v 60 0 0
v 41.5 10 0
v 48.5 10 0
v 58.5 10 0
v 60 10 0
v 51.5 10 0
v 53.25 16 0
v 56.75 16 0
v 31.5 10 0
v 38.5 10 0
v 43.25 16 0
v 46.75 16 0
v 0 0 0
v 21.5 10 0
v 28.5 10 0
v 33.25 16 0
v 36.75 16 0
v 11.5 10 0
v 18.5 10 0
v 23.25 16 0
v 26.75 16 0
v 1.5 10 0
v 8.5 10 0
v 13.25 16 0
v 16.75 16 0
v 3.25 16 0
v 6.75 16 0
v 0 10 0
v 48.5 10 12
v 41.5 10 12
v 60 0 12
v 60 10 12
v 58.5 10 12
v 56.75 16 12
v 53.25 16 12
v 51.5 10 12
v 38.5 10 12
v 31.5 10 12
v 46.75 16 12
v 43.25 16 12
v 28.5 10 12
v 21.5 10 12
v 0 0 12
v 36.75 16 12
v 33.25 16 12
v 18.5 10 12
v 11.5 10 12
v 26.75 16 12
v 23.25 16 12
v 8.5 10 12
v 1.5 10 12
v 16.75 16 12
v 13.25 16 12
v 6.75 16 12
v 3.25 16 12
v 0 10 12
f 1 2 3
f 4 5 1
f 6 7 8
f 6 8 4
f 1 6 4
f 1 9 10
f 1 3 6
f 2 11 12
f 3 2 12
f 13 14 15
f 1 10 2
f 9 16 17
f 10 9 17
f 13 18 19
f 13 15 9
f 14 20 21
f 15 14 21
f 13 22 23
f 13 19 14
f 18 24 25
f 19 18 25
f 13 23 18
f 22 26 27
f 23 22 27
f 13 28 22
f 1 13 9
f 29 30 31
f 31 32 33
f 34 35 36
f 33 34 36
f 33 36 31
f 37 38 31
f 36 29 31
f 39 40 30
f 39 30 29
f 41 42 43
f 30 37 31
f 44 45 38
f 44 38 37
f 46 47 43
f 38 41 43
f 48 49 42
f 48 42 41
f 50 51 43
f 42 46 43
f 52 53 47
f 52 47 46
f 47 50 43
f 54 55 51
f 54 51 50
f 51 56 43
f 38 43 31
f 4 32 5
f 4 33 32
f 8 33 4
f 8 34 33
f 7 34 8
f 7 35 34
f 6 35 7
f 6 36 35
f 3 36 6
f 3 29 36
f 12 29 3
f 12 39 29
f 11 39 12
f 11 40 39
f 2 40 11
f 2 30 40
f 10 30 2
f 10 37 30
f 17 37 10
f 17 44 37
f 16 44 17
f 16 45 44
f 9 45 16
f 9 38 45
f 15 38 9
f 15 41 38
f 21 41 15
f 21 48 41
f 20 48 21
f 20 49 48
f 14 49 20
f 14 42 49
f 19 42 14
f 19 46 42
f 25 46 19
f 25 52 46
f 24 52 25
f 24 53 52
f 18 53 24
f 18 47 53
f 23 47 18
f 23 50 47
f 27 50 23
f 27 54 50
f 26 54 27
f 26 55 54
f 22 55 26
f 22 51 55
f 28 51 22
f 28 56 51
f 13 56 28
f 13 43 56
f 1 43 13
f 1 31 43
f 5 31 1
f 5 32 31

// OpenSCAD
$fn = 32;

// ----------------------------------------------------------------------
// Gear rack: 6 teeth, pitch 10 mm
// ----------------------------------------------------------------------

// --- parameters (mm) ---
teeth = 6;                // number of teeth
pitch = 10;               // tooth pitch, X
root_w = 7;               // tooth width at the root
tip_w = 3.5;              // tooth width at the tip
base_h = 10;              // rack body height, Y
tooth_h = 6;              // tooth height above the body
plate_t = 12;             // rack width, Z (extrusion height)

rack_l = teeth * pitch;  // overall length
total_h = base_h + tooth_h;  // overall height

profile = [[0, 0], [60, 0], [60, 10], [58.5, 10], [56.75, 16], [53.25, 16], [51.5, 10], [48.5, 10], [46.75, 16], [43.25, 16], [41.5, 10], [38.5, 10], [36.75, 16], [33.25, 16], [31.5, 10], [28.5, 10], [26.75, 16], [23.25, 16], [21.5, 10], [18.5, 10], [16.75, 16], [13.25, 16], [11.5, 10], [8.5, 10], [6.75, 16], [3.25, 16], [1.5, 10], [0, 10]];  // primary outline, 28 points, counter clockwise

// --- the one profile operation ---
linear_extrude(height = plate_t) polygon(points = profile);
